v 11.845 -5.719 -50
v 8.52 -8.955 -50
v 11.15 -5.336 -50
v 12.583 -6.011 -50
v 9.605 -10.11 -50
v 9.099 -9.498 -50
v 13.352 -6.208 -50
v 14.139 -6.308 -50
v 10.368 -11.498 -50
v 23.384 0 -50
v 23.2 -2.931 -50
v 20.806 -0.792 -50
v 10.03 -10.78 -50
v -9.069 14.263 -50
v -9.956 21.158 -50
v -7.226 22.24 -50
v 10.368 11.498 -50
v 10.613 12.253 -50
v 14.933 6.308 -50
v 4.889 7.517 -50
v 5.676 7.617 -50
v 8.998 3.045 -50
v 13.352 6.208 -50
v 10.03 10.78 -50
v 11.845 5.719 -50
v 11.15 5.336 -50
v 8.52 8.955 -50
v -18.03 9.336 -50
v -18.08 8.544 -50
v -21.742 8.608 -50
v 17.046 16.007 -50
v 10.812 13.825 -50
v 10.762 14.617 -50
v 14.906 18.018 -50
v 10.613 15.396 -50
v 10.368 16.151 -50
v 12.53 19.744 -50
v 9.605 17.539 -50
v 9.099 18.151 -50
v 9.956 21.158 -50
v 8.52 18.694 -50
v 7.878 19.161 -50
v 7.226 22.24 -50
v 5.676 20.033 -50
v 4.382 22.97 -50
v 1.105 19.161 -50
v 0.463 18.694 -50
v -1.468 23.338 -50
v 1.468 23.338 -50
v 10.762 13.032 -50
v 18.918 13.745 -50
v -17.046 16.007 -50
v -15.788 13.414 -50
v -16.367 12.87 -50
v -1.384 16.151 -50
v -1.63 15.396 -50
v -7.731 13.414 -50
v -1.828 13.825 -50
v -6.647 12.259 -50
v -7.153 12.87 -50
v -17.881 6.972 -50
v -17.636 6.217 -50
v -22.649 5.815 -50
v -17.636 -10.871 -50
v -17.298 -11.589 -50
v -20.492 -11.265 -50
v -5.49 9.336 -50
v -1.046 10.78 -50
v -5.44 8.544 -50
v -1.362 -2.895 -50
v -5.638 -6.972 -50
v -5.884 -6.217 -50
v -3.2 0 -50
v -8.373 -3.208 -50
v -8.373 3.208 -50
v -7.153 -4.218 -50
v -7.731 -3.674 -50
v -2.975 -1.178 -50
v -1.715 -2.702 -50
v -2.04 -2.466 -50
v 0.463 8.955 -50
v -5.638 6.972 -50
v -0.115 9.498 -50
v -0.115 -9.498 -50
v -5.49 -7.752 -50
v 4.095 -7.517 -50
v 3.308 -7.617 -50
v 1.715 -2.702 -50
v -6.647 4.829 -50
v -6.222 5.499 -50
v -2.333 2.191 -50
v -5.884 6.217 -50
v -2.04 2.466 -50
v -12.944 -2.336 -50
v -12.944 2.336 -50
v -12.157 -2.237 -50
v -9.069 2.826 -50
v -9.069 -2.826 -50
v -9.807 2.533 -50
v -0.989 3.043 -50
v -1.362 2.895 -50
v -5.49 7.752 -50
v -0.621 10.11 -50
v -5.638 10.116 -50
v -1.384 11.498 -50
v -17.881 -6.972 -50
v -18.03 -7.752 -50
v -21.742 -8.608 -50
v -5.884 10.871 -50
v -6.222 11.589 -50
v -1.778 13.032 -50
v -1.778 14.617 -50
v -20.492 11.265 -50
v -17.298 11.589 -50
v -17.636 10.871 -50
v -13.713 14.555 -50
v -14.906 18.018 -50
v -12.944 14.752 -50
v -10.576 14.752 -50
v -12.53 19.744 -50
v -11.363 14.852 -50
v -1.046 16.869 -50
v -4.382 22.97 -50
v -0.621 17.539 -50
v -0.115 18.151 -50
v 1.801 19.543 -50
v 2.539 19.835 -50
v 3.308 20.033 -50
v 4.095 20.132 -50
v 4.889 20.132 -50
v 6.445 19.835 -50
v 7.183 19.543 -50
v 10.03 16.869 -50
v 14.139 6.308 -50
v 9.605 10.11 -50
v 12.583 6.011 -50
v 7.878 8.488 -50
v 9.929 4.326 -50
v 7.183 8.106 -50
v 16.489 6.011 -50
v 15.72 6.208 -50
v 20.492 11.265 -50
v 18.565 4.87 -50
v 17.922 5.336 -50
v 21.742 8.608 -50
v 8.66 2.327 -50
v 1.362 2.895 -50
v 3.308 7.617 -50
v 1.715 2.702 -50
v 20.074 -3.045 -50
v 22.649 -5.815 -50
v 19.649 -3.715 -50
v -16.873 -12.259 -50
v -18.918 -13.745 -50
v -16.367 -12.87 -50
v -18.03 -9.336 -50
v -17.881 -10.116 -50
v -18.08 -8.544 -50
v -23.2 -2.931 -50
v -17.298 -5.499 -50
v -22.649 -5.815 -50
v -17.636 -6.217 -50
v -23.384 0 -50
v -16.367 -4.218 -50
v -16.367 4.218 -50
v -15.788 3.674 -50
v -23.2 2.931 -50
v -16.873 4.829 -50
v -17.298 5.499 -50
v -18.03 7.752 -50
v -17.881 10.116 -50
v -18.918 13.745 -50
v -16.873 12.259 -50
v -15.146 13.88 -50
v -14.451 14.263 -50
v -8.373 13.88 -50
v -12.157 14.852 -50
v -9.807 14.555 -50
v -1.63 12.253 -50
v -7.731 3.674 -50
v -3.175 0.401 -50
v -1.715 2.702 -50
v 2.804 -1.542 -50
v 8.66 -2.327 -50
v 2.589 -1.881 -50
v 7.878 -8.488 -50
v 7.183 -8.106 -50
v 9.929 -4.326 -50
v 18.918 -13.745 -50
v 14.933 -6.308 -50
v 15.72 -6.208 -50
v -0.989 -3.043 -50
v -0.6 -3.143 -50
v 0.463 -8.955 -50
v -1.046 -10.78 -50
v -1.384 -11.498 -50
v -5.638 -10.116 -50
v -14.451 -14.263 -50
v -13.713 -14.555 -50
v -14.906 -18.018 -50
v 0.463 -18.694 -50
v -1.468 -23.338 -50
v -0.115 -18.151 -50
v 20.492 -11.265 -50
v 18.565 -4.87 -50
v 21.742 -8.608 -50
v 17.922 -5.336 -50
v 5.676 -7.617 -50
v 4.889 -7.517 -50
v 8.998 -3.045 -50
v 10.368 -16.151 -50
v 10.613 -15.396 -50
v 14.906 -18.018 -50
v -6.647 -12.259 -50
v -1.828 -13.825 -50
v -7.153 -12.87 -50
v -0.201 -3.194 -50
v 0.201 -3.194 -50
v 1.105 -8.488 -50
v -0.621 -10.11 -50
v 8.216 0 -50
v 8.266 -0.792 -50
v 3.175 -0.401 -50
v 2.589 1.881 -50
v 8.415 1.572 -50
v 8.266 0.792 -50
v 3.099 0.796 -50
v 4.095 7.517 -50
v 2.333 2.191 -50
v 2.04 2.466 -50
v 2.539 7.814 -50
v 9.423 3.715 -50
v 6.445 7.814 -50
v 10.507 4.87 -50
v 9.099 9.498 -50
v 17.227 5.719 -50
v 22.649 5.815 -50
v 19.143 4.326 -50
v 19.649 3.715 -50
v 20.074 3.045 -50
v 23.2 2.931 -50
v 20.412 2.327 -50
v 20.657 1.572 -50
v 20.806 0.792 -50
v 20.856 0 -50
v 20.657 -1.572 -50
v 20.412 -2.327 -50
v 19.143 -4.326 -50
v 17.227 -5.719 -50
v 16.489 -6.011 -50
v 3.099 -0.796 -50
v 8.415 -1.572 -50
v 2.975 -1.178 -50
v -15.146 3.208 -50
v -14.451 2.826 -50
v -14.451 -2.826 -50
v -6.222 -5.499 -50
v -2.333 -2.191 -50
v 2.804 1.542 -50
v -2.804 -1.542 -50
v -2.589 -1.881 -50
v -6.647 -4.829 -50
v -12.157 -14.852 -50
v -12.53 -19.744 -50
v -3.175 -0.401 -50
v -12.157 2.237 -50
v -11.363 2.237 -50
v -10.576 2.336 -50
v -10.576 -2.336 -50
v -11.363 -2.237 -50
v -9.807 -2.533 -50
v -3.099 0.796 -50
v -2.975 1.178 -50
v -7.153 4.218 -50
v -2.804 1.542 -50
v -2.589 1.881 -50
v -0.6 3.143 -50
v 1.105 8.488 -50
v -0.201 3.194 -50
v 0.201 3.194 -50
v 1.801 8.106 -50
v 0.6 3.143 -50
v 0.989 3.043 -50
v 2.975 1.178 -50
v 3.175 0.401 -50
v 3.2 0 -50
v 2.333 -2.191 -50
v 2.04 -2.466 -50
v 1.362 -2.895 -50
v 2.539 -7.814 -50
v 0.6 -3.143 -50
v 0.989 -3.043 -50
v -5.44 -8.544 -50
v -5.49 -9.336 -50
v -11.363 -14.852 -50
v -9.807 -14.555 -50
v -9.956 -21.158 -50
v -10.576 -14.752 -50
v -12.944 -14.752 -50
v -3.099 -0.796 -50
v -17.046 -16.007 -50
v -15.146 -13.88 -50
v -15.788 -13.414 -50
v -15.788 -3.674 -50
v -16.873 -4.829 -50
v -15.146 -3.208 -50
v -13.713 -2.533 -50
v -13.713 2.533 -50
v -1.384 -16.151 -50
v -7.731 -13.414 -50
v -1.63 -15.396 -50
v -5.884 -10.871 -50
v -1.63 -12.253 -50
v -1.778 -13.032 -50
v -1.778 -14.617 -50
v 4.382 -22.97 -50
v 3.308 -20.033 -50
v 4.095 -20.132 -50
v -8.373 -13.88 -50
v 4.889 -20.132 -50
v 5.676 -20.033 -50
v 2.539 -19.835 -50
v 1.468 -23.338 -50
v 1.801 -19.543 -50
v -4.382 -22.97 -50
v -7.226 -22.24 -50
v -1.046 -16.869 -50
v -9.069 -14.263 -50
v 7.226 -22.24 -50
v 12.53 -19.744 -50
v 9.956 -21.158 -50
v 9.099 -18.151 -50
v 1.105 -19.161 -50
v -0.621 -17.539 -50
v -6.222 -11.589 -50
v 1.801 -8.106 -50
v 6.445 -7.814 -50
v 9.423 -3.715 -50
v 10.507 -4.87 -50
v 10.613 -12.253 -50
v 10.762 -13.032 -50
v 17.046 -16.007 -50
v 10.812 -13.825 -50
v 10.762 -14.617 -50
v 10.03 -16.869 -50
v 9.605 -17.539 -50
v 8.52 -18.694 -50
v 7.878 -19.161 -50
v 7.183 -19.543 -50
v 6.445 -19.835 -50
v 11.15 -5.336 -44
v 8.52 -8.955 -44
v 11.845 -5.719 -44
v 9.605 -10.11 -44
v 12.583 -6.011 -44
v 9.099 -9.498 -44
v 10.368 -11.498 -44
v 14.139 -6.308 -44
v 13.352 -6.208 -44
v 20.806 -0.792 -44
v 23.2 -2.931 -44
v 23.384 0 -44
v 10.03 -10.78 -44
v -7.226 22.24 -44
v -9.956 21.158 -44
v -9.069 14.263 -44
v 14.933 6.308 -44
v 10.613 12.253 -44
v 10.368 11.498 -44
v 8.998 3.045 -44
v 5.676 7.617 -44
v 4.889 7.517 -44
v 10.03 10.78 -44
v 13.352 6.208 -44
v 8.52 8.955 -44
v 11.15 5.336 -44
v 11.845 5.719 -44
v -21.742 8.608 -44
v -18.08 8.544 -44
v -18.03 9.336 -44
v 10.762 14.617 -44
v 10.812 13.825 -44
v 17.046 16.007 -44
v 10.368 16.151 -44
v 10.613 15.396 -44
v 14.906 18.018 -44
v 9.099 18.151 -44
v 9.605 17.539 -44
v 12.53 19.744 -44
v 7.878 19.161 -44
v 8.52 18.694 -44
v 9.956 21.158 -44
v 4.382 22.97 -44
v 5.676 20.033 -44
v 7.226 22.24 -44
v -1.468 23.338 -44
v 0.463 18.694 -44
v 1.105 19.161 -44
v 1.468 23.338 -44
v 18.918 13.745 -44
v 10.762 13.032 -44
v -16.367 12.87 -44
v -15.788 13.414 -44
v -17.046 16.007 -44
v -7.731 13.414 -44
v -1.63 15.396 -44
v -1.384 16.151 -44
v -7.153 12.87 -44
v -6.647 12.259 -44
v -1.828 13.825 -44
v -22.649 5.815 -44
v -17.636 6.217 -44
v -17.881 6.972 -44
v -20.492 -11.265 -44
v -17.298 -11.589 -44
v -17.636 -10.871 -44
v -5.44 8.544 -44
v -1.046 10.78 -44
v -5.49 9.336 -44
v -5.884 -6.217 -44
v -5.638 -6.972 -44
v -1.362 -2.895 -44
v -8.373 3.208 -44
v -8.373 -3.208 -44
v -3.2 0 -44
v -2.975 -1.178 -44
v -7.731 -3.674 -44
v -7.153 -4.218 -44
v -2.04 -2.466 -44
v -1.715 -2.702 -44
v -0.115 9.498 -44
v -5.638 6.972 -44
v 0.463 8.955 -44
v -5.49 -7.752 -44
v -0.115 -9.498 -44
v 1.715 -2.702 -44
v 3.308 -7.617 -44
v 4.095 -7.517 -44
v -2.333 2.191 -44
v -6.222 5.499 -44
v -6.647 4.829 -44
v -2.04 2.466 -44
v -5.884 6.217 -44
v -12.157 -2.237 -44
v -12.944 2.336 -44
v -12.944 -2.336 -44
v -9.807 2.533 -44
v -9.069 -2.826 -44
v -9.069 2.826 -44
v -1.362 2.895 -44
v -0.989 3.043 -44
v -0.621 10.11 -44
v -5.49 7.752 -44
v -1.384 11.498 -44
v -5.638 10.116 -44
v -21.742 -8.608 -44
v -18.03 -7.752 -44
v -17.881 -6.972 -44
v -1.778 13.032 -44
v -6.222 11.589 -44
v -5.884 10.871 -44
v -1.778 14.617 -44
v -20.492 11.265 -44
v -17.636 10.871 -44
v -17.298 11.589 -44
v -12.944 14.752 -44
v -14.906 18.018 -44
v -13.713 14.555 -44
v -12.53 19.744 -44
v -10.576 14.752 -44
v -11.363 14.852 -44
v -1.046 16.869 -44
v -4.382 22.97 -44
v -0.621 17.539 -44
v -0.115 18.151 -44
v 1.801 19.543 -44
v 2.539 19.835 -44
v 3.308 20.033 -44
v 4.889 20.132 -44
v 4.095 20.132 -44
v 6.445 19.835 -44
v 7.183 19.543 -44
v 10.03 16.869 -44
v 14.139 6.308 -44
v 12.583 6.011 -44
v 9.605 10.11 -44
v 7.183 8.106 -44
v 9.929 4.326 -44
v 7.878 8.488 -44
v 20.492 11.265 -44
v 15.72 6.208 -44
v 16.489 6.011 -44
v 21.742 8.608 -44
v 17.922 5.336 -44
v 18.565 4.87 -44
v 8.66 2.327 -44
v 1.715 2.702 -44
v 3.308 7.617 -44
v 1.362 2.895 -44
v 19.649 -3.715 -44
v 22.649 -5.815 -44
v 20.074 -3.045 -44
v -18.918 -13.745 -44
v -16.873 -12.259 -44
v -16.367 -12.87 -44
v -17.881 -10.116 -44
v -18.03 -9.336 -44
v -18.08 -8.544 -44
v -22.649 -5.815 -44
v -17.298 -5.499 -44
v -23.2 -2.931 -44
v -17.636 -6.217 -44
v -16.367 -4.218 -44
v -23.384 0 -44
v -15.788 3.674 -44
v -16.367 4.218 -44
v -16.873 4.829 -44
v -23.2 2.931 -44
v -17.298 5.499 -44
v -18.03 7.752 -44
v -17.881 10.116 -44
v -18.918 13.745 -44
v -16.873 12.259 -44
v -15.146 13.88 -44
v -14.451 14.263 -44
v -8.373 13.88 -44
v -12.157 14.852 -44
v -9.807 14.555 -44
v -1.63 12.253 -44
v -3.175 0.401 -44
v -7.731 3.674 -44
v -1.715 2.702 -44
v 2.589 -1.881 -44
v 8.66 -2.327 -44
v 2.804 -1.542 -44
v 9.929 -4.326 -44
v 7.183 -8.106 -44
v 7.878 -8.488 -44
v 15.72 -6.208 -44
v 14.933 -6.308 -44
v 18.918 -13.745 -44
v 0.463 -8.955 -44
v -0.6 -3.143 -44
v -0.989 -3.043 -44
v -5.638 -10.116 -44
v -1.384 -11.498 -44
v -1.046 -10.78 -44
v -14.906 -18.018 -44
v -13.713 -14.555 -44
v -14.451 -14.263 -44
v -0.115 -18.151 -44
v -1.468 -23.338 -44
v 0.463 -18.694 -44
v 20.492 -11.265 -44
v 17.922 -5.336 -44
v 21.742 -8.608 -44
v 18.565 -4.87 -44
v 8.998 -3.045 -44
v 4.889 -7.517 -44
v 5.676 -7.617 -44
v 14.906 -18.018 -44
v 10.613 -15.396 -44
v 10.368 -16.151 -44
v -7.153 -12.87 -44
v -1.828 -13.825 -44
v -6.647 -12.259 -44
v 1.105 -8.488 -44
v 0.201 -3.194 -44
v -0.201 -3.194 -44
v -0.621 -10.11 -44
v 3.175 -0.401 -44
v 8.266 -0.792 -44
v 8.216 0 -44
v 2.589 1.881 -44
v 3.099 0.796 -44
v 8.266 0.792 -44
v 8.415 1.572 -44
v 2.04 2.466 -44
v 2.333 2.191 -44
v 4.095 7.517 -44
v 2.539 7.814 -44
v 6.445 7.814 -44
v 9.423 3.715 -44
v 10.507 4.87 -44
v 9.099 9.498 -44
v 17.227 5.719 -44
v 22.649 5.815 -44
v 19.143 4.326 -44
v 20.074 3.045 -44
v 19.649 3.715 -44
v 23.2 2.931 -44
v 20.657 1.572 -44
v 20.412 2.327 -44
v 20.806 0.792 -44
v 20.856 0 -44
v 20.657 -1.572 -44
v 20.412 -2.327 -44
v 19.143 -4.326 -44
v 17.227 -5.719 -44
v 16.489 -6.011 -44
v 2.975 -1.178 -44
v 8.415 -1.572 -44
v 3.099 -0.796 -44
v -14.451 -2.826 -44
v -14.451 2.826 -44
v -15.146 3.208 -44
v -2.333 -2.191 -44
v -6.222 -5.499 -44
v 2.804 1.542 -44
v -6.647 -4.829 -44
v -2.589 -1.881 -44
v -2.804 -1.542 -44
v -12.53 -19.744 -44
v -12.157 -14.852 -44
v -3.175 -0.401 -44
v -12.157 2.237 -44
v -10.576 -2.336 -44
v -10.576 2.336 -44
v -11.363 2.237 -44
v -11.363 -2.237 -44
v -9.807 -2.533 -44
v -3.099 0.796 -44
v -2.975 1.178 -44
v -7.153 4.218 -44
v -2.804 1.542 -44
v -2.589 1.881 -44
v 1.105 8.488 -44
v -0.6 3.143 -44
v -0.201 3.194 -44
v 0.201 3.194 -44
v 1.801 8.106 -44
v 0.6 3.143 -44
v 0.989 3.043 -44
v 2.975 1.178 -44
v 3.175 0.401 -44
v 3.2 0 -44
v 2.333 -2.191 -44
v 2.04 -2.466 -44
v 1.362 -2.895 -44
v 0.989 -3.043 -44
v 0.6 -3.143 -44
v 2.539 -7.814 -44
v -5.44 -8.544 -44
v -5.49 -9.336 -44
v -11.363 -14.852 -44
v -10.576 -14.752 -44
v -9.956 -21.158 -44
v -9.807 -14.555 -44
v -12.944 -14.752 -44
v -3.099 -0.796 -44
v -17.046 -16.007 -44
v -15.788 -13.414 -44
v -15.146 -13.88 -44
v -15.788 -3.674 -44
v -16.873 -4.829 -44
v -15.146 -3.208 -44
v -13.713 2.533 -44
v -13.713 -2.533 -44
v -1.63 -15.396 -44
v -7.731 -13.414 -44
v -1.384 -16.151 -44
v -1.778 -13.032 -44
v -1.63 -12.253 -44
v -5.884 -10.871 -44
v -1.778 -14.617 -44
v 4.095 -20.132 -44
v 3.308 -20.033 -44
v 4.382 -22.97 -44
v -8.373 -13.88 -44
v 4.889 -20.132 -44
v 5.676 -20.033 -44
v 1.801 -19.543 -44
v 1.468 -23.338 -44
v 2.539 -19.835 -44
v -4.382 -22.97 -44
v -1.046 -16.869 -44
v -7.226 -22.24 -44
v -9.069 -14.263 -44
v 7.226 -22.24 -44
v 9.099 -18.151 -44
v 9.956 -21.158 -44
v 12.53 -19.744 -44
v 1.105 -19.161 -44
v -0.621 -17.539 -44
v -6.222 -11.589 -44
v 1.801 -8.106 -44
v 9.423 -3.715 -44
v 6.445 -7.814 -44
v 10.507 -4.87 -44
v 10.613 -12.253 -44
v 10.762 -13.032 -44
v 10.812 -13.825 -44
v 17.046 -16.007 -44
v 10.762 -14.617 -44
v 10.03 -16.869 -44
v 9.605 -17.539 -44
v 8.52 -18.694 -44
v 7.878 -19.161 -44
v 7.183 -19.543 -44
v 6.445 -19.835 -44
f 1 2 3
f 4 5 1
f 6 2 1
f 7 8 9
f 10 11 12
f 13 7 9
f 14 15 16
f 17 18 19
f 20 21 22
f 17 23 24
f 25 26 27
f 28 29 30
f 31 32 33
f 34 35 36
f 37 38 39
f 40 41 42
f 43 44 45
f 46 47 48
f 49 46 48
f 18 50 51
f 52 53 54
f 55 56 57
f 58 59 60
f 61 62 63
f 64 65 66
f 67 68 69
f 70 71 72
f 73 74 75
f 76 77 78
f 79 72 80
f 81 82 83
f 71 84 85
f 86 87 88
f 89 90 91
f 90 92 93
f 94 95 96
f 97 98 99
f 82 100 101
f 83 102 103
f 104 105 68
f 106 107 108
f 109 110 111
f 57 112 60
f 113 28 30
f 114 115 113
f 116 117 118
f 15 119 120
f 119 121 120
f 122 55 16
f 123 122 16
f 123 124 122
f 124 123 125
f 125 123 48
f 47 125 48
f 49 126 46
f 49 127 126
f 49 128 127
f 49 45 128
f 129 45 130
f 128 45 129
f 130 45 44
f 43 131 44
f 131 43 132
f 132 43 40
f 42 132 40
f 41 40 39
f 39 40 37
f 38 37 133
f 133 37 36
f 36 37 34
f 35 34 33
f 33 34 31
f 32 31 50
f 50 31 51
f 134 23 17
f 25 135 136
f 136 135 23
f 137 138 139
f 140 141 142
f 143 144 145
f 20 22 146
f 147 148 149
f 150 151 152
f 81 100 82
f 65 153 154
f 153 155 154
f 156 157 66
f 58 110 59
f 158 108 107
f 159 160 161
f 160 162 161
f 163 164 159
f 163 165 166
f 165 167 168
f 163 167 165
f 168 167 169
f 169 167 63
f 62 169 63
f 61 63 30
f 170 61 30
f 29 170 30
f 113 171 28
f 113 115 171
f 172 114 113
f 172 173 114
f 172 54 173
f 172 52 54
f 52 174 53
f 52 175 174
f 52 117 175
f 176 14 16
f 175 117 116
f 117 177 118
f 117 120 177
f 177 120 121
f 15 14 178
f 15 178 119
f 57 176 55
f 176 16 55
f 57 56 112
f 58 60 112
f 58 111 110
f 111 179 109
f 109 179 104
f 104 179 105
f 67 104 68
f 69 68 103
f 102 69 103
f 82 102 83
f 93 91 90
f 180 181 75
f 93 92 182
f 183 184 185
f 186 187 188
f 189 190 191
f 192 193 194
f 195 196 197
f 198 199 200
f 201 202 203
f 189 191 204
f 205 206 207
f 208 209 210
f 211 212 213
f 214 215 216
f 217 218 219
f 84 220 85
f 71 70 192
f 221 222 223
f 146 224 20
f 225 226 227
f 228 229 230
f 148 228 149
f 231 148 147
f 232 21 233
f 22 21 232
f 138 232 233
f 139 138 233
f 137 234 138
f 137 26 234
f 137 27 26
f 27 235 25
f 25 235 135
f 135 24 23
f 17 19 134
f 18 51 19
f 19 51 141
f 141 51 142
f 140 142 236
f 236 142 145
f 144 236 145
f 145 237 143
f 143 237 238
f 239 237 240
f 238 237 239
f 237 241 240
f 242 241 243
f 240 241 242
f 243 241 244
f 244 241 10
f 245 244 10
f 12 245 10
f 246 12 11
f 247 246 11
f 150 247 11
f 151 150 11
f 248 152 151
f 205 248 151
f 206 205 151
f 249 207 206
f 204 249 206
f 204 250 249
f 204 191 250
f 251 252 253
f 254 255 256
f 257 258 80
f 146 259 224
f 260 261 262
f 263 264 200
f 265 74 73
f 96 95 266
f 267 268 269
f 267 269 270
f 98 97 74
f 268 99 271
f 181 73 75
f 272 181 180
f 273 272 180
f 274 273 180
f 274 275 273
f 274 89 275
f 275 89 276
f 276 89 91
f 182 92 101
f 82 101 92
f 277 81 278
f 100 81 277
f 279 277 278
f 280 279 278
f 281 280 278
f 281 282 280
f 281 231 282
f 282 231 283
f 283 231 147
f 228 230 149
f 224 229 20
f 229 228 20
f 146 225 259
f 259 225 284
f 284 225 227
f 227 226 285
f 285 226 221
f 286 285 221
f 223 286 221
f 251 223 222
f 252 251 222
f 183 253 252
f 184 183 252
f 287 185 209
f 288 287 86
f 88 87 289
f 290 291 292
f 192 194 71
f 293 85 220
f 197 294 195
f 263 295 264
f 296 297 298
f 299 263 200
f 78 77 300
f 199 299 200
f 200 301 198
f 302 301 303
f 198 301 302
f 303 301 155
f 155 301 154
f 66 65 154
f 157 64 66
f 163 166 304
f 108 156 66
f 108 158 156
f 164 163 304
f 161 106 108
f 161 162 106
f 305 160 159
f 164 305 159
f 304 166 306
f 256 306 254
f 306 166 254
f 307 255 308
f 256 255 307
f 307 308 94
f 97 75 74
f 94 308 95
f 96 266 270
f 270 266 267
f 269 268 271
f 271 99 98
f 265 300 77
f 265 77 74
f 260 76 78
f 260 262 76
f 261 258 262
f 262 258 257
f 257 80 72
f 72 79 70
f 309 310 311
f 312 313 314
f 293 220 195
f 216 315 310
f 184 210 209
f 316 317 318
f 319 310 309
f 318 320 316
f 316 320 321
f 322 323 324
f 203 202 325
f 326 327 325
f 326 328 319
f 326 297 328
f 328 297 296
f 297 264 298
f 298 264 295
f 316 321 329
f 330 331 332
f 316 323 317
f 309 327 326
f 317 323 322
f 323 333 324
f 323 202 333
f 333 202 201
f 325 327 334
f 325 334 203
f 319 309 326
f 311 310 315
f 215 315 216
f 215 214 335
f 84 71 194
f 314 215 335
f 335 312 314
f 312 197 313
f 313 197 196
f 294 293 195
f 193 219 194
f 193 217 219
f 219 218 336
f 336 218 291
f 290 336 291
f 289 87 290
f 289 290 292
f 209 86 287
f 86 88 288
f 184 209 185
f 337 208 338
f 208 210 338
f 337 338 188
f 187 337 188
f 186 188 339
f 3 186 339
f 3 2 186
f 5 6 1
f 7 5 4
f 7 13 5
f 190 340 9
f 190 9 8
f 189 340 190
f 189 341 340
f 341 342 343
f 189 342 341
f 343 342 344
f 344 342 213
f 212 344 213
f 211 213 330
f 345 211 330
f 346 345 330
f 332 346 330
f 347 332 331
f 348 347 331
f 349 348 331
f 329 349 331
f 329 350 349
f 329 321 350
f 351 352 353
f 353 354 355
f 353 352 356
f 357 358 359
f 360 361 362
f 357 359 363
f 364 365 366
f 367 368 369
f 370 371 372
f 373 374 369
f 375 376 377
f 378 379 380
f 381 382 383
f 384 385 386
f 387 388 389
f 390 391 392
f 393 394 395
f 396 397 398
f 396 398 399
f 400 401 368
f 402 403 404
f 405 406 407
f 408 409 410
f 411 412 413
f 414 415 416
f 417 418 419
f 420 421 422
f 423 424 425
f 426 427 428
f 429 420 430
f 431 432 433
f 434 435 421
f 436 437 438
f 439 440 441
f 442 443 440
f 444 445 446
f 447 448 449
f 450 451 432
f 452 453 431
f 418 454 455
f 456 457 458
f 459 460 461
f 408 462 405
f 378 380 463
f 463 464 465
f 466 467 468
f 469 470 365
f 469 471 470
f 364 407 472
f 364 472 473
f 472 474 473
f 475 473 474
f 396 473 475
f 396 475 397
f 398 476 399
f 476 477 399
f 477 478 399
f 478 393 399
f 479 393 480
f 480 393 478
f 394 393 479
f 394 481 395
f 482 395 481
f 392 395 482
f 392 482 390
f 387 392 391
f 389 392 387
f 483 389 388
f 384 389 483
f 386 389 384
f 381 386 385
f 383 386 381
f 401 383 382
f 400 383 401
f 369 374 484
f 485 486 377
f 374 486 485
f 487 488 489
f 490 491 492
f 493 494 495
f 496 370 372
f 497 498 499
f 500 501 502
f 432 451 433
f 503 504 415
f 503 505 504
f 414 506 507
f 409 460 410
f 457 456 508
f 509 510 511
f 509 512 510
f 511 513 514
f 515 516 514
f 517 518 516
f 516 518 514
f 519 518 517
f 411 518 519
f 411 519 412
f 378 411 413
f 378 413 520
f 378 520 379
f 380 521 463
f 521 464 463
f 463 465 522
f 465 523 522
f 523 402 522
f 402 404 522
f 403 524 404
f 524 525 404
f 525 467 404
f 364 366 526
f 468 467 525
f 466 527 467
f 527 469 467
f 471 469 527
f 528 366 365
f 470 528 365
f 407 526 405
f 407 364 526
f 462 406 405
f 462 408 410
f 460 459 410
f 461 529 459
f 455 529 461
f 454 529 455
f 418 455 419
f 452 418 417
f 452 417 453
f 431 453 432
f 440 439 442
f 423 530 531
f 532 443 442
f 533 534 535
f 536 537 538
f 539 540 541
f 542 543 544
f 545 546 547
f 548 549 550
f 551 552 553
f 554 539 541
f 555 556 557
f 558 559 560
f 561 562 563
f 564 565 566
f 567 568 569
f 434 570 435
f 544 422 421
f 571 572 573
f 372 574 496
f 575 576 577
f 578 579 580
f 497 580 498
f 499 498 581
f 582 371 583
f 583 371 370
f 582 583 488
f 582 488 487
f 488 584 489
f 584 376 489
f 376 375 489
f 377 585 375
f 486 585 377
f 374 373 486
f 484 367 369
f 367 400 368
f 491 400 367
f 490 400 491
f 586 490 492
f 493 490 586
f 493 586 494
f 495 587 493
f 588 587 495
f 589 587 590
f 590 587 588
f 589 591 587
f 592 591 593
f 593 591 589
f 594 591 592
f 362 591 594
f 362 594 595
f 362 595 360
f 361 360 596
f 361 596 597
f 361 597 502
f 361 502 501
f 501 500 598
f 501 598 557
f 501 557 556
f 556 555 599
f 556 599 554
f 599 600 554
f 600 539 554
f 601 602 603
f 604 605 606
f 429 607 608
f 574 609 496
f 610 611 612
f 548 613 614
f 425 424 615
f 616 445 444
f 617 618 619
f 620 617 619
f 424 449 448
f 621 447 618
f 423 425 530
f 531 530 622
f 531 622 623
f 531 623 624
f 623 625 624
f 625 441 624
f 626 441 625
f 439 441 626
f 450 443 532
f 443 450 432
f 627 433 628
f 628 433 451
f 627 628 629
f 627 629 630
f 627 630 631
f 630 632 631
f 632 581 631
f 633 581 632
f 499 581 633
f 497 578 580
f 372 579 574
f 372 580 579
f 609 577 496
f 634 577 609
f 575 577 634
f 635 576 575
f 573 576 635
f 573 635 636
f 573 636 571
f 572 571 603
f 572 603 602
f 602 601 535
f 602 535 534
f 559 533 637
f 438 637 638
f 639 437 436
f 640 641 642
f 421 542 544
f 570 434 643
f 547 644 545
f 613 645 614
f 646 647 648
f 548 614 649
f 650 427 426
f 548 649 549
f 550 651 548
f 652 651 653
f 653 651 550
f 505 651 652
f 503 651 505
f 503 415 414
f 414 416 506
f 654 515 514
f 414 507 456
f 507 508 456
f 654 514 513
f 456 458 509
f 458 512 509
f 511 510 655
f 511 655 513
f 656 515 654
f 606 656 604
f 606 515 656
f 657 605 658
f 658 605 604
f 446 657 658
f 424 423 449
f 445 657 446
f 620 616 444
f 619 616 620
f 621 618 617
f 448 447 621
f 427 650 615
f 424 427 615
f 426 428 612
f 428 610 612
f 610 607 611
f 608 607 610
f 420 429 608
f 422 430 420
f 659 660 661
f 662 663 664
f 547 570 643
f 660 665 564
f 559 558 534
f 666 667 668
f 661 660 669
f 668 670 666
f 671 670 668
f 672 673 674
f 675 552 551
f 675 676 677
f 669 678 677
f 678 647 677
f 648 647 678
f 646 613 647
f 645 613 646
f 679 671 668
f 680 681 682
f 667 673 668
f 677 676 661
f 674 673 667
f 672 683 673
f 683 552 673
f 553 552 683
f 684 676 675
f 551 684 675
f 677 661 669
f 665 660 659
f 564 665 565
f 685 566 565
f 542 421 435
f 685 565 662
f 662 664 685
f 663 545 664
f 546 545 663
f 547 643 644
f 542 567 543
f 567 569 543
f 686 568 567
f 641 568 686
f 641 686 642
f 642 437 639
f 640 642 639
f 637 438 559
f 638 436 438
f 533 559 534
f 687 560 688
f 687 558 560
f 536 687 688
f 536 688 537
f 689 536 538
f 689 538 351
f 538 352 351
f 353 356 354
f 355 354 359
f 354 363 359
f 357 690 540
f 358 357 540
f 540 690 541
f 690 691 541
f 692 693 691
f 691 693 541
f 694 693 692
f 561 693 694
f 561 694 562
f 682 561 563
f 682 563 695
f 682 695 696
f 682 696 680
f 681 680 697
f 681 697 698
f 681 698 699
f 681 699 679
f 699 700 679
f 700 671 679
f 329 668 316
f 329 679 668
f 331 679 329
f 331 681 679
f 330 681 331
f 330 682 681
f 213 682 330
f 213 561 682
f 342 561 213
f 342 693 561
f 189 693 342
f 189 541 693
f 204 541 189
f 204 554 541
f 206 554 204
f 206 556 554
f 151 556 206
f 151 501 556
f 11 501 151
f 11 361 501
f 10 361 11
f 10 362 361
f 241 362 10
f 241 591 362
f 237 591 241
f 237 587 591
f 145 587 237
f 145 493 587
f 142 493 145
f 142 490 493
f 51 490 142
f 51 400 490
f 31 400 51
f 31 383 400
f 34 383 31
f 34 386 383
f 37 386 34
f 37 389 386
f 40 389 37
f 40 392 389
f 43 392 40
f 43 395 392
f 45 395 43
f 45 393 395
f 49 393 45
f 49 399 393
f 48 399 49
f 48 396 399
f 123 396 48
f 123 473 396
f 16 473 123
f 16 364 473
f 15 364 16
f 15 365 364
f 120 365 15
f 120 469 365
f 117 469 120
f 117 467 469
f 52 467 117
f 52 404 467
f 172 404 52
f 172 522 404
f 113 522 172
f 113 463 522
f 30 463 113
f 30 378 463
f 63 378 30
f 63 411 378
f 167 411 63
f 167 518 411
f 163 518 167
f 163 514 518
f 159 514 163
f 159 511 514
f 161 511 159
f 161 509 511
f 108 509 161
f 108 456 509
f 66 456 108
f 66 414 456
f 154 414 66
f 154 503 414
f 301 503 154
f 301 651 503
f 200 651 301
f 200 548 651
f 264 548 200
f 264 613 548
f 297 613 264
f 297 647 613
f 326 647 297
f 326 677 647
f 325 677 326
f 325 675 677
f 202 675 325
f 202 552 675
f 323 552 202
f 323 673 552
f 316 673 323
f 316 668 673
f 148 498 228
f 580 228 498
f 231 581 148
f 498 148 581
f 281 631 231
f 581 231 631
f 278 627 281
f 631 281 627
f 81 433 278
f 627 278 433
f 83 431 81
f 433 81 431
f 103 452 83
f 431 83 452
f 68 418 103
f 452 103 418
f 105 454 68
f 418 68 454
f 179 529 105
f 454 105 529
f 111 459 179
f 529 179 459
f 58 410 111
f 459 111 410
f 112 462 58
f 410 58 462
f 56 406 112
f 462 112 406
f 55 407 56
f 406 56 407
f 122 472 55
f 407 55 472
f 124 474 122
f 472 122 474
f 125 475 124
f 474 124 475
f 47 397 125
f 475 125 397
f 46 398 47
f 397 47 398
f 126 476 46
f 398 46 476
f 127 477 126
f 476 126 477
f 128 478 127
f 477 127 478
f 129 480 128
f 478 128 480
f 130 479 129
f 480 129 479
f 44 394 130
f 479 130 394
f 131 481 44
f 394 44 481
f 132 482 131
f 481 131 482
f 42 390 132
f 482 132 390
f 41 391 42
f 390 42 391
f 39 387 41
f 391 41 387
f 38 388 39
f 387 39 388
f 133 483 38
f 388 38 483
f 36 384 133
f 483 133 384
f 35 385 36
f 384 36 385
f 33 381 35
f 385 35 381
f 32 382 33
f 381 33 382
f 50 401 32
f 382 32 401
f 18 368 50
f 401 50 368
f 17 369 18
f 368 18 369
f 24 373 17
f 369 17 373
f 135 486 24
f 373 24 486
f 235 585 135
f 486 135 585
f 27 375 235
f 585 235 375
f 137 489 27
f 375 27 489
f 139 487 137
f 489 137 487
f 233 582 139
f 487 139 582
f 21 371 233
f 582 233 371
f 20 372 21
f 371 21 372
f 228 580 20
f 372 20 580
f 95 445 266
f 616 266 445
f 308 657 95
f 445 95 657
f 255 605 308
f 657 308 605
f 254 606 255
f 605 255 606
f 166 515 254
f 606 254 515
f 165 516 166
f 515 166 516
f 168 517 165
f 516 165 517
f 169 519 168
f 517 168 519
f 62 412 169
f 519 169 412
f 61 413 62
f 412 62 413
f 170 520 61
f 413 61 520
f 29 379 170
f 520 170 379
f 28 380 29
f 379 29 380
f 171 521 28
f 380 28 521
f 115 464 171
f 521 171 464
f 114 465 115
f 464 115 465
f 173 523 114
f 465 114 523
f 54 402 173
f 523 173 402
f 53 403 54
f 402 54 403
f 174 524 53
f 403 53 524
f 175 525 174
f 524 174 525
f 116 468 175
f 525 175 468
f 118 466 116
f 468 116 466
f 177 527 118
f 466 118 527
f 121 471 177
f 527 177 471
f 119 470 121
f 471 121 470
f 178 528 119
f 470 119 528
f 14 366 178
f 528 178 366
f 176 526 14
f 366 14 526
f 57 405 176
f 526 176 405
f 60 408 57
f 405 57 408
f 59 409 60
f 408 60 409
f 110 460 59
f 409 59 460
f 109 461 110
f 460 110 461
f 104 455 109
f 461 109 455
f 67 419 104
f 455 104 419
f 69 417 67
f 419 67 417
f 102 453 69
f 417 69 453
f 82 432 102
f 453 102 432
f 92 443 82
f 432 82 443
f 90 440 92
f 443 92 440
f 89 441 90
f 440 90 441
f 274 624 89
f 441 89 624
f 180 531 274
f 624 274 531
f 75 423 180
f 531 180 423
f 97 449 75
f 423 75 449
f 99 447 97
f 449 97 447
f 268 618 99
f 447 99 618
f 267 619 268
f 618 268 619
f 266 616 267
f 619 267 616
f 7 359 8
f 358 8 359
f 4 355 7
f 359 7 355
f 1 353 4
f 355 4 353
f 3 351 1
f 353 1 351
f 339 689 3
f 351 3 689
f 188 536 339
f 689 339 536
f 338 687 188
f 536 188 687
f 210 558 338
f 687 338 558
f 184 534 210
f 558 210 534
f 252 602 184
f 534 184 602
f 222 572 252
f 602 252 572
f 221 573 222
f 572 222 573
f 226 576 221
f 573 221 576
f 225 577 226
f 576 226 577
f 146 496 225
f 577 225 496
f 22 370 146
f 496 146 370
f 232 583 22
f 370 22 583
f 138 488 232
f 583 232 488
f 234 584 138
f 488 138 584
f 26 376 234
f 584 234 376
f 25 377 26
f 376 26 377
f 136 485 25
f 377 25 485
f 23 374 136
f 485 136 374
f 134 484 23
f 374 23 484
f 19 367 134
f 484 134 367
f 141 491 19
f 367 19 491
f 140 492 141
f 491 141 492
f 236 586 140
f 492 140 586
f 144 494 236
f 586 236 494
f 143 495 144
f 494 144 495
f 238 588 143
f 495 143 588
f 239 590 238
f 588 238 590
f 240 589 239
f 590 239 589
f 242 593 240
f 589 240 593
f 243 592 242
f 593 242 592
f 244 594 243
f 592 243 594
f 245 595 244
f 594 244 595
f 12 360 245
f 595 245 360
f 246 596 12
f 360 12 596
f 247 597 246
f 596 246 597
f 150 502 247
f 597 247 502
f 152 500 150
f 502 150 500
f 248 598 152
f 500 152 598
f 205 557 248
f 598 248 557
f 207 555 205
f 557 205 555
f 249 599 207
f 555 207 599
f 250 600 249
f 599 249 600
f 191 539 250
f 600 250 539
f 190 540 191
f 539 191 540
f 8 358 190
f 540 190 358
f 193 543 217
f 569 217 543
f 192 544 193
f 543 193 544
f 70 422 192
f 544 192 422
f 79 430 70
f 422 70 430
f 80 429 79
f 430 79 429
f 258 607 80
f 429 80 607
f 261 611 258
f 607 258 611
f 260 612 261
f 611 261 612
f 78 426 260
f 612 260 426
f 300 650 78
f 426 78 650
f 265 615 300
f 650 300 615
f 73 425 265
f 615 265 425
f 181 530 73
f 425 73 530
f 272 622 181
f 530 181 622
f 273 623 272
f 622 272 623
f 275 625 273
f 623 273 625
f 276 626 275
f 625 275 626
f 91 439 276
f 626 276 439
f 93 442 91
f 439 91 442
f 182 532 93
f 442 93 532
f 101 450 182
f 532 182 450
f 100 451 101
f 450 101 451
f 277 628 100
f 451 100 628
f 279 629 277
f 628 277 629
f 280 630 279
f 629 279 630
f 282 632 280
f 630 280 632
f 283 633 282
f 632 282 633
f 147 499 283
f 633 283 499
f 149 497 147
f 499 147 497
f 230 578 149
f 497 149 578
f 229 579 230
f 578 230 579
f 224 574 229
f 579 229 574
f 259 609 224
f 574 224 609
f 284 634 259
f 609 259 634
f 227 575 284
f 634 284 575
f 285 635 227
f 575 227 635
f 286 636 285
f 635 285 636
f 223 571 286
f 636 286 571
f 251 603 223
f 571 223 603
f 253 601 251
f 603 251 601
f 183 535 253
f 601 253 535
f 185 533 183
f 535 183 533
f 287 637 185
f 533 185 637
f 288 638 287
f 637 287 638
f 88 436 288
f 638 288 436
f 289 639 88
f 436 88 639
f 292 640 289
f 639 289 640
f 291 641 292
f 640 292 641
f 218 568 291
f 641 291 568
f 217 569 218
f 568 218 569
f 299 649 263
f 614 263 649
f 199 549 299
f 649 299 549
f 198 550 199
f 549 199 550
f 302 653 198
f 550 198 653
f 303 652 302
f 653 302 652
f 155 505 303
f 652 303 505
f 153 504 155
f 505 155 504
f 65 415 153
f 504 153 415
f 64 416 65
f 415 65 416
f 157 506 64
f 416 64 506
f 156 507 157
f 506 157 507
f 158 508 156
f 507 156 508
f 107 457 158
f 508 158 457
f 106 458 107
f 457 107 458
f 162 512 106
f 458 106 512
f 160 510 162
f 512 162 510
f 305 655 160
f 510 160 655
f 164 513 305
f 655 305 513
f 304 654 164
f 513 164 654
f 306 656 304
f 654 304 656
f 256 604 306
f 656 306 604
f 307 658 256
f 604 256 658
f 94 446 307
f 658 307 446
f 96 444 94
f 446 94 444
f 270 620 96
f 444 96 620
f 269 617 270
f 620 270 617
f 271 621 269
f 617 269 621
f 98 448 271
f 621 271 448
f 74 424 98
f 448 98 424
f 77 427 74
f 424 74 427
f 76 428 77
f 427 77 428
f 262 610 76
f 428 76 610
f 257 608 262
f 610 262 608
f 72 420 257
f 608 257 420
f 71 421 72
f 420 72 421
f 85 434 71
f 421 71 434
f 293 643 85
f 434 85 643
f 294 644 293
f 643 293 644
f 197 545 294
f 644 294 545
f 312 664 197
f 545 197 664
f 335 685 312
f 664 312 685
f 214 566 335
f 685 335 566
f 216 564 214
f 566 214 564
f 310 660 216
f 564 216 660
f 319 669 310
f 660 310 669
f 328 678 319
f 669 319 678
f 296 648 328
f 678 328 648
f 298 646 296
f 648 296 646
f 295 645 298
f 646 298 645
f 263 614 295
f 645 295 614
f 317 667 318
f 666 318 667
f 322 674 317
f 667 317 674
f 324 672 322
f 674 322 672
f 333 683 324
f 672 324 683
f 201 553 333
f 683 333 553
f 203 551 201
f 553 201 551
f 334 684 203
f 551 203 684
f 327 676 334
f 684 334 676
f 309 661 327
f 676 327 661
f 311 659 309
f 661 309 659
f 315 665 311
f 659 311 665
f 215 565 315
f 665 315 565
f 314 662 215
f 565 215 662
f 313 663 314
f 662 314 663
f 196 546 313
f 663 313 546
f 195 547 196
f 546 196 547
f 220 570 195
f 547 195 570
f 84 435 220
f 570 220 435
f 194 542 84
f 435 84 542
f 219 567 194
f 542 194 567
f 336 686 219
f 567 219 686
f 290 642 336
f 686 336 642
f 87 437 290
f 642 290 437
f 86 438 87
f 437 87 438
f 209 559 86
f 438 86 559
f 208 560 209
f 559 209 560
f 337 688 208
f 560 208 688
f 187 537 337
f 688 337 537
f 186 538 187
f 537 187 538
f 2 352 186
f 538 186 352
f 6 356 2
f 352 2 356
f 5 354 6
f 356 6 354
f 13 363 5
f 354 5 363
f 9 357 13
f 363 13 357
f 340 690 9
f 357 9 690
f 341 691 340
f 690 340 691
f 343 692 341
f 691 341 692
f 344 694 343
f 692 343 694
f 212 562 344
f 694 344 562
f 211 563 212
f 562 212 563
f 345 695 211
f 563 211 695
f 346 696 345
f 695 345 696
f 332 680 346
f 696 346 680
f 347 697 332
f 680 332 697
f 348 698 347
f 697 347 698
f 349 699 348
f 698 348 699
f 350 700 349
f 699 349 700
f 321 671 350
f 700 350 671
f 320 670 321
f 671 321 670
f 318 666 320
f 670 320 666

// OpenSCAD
$fn=50;
tube_radius = 12;
inner_tube_radius = 6.32;
holder_height = 6;
middle_rod = 3.2;
middle_rod_bottom = 5.2;
module top(){
    linear_extrude(height = holder_height){
        difference(){    
            circle(r = inner_tube_radius*3.7);
           
            
            for (i=[1: 5]) {
                rotate([0,0,i*360/5]) {
                    translate([inner_tube_radius*2.3,0,0]){
                        circle(r = inner_tube_radius);
                    }
                }
            }
            //middle_rod
            circle(r=middle_rod);
        }        
    }
}

module bottom(){
    difference(){    
        linear_extrude(height = holder_height){        
            circle(r = inner_tube_radius*3.7);
        }
        linear_extrude(height = holder_height/2){           
            
            for (i=[1: 5]) {
                rotate([0,0,i*360/5]) {
                    translate([inner_tube_radius*2.3,0,0]){
                        circle(r = inner_tube_radius);
                    }
                }
            }           
        }
    //middle_rod    
         linear_extrude(height = holder_height){   
         
            circle(r=middle_rod_bottom);
         }
         translate([-2.1/2,-middle_rod_bottom-2,0]){
             cube([2.1,middle_rod_bottom*2+4,holder_height]){
             }
         }  
         rotate([0,0,90]){
             translate([-2.1/2,-middle_rod_bottom-2,0]){
                 cube([2.1,middle_rod_bottom*2+4,holder_height]){
                 }
             }  
         }
    }
}

translate([0,0,-50]){
    top();
}
//bottom();
